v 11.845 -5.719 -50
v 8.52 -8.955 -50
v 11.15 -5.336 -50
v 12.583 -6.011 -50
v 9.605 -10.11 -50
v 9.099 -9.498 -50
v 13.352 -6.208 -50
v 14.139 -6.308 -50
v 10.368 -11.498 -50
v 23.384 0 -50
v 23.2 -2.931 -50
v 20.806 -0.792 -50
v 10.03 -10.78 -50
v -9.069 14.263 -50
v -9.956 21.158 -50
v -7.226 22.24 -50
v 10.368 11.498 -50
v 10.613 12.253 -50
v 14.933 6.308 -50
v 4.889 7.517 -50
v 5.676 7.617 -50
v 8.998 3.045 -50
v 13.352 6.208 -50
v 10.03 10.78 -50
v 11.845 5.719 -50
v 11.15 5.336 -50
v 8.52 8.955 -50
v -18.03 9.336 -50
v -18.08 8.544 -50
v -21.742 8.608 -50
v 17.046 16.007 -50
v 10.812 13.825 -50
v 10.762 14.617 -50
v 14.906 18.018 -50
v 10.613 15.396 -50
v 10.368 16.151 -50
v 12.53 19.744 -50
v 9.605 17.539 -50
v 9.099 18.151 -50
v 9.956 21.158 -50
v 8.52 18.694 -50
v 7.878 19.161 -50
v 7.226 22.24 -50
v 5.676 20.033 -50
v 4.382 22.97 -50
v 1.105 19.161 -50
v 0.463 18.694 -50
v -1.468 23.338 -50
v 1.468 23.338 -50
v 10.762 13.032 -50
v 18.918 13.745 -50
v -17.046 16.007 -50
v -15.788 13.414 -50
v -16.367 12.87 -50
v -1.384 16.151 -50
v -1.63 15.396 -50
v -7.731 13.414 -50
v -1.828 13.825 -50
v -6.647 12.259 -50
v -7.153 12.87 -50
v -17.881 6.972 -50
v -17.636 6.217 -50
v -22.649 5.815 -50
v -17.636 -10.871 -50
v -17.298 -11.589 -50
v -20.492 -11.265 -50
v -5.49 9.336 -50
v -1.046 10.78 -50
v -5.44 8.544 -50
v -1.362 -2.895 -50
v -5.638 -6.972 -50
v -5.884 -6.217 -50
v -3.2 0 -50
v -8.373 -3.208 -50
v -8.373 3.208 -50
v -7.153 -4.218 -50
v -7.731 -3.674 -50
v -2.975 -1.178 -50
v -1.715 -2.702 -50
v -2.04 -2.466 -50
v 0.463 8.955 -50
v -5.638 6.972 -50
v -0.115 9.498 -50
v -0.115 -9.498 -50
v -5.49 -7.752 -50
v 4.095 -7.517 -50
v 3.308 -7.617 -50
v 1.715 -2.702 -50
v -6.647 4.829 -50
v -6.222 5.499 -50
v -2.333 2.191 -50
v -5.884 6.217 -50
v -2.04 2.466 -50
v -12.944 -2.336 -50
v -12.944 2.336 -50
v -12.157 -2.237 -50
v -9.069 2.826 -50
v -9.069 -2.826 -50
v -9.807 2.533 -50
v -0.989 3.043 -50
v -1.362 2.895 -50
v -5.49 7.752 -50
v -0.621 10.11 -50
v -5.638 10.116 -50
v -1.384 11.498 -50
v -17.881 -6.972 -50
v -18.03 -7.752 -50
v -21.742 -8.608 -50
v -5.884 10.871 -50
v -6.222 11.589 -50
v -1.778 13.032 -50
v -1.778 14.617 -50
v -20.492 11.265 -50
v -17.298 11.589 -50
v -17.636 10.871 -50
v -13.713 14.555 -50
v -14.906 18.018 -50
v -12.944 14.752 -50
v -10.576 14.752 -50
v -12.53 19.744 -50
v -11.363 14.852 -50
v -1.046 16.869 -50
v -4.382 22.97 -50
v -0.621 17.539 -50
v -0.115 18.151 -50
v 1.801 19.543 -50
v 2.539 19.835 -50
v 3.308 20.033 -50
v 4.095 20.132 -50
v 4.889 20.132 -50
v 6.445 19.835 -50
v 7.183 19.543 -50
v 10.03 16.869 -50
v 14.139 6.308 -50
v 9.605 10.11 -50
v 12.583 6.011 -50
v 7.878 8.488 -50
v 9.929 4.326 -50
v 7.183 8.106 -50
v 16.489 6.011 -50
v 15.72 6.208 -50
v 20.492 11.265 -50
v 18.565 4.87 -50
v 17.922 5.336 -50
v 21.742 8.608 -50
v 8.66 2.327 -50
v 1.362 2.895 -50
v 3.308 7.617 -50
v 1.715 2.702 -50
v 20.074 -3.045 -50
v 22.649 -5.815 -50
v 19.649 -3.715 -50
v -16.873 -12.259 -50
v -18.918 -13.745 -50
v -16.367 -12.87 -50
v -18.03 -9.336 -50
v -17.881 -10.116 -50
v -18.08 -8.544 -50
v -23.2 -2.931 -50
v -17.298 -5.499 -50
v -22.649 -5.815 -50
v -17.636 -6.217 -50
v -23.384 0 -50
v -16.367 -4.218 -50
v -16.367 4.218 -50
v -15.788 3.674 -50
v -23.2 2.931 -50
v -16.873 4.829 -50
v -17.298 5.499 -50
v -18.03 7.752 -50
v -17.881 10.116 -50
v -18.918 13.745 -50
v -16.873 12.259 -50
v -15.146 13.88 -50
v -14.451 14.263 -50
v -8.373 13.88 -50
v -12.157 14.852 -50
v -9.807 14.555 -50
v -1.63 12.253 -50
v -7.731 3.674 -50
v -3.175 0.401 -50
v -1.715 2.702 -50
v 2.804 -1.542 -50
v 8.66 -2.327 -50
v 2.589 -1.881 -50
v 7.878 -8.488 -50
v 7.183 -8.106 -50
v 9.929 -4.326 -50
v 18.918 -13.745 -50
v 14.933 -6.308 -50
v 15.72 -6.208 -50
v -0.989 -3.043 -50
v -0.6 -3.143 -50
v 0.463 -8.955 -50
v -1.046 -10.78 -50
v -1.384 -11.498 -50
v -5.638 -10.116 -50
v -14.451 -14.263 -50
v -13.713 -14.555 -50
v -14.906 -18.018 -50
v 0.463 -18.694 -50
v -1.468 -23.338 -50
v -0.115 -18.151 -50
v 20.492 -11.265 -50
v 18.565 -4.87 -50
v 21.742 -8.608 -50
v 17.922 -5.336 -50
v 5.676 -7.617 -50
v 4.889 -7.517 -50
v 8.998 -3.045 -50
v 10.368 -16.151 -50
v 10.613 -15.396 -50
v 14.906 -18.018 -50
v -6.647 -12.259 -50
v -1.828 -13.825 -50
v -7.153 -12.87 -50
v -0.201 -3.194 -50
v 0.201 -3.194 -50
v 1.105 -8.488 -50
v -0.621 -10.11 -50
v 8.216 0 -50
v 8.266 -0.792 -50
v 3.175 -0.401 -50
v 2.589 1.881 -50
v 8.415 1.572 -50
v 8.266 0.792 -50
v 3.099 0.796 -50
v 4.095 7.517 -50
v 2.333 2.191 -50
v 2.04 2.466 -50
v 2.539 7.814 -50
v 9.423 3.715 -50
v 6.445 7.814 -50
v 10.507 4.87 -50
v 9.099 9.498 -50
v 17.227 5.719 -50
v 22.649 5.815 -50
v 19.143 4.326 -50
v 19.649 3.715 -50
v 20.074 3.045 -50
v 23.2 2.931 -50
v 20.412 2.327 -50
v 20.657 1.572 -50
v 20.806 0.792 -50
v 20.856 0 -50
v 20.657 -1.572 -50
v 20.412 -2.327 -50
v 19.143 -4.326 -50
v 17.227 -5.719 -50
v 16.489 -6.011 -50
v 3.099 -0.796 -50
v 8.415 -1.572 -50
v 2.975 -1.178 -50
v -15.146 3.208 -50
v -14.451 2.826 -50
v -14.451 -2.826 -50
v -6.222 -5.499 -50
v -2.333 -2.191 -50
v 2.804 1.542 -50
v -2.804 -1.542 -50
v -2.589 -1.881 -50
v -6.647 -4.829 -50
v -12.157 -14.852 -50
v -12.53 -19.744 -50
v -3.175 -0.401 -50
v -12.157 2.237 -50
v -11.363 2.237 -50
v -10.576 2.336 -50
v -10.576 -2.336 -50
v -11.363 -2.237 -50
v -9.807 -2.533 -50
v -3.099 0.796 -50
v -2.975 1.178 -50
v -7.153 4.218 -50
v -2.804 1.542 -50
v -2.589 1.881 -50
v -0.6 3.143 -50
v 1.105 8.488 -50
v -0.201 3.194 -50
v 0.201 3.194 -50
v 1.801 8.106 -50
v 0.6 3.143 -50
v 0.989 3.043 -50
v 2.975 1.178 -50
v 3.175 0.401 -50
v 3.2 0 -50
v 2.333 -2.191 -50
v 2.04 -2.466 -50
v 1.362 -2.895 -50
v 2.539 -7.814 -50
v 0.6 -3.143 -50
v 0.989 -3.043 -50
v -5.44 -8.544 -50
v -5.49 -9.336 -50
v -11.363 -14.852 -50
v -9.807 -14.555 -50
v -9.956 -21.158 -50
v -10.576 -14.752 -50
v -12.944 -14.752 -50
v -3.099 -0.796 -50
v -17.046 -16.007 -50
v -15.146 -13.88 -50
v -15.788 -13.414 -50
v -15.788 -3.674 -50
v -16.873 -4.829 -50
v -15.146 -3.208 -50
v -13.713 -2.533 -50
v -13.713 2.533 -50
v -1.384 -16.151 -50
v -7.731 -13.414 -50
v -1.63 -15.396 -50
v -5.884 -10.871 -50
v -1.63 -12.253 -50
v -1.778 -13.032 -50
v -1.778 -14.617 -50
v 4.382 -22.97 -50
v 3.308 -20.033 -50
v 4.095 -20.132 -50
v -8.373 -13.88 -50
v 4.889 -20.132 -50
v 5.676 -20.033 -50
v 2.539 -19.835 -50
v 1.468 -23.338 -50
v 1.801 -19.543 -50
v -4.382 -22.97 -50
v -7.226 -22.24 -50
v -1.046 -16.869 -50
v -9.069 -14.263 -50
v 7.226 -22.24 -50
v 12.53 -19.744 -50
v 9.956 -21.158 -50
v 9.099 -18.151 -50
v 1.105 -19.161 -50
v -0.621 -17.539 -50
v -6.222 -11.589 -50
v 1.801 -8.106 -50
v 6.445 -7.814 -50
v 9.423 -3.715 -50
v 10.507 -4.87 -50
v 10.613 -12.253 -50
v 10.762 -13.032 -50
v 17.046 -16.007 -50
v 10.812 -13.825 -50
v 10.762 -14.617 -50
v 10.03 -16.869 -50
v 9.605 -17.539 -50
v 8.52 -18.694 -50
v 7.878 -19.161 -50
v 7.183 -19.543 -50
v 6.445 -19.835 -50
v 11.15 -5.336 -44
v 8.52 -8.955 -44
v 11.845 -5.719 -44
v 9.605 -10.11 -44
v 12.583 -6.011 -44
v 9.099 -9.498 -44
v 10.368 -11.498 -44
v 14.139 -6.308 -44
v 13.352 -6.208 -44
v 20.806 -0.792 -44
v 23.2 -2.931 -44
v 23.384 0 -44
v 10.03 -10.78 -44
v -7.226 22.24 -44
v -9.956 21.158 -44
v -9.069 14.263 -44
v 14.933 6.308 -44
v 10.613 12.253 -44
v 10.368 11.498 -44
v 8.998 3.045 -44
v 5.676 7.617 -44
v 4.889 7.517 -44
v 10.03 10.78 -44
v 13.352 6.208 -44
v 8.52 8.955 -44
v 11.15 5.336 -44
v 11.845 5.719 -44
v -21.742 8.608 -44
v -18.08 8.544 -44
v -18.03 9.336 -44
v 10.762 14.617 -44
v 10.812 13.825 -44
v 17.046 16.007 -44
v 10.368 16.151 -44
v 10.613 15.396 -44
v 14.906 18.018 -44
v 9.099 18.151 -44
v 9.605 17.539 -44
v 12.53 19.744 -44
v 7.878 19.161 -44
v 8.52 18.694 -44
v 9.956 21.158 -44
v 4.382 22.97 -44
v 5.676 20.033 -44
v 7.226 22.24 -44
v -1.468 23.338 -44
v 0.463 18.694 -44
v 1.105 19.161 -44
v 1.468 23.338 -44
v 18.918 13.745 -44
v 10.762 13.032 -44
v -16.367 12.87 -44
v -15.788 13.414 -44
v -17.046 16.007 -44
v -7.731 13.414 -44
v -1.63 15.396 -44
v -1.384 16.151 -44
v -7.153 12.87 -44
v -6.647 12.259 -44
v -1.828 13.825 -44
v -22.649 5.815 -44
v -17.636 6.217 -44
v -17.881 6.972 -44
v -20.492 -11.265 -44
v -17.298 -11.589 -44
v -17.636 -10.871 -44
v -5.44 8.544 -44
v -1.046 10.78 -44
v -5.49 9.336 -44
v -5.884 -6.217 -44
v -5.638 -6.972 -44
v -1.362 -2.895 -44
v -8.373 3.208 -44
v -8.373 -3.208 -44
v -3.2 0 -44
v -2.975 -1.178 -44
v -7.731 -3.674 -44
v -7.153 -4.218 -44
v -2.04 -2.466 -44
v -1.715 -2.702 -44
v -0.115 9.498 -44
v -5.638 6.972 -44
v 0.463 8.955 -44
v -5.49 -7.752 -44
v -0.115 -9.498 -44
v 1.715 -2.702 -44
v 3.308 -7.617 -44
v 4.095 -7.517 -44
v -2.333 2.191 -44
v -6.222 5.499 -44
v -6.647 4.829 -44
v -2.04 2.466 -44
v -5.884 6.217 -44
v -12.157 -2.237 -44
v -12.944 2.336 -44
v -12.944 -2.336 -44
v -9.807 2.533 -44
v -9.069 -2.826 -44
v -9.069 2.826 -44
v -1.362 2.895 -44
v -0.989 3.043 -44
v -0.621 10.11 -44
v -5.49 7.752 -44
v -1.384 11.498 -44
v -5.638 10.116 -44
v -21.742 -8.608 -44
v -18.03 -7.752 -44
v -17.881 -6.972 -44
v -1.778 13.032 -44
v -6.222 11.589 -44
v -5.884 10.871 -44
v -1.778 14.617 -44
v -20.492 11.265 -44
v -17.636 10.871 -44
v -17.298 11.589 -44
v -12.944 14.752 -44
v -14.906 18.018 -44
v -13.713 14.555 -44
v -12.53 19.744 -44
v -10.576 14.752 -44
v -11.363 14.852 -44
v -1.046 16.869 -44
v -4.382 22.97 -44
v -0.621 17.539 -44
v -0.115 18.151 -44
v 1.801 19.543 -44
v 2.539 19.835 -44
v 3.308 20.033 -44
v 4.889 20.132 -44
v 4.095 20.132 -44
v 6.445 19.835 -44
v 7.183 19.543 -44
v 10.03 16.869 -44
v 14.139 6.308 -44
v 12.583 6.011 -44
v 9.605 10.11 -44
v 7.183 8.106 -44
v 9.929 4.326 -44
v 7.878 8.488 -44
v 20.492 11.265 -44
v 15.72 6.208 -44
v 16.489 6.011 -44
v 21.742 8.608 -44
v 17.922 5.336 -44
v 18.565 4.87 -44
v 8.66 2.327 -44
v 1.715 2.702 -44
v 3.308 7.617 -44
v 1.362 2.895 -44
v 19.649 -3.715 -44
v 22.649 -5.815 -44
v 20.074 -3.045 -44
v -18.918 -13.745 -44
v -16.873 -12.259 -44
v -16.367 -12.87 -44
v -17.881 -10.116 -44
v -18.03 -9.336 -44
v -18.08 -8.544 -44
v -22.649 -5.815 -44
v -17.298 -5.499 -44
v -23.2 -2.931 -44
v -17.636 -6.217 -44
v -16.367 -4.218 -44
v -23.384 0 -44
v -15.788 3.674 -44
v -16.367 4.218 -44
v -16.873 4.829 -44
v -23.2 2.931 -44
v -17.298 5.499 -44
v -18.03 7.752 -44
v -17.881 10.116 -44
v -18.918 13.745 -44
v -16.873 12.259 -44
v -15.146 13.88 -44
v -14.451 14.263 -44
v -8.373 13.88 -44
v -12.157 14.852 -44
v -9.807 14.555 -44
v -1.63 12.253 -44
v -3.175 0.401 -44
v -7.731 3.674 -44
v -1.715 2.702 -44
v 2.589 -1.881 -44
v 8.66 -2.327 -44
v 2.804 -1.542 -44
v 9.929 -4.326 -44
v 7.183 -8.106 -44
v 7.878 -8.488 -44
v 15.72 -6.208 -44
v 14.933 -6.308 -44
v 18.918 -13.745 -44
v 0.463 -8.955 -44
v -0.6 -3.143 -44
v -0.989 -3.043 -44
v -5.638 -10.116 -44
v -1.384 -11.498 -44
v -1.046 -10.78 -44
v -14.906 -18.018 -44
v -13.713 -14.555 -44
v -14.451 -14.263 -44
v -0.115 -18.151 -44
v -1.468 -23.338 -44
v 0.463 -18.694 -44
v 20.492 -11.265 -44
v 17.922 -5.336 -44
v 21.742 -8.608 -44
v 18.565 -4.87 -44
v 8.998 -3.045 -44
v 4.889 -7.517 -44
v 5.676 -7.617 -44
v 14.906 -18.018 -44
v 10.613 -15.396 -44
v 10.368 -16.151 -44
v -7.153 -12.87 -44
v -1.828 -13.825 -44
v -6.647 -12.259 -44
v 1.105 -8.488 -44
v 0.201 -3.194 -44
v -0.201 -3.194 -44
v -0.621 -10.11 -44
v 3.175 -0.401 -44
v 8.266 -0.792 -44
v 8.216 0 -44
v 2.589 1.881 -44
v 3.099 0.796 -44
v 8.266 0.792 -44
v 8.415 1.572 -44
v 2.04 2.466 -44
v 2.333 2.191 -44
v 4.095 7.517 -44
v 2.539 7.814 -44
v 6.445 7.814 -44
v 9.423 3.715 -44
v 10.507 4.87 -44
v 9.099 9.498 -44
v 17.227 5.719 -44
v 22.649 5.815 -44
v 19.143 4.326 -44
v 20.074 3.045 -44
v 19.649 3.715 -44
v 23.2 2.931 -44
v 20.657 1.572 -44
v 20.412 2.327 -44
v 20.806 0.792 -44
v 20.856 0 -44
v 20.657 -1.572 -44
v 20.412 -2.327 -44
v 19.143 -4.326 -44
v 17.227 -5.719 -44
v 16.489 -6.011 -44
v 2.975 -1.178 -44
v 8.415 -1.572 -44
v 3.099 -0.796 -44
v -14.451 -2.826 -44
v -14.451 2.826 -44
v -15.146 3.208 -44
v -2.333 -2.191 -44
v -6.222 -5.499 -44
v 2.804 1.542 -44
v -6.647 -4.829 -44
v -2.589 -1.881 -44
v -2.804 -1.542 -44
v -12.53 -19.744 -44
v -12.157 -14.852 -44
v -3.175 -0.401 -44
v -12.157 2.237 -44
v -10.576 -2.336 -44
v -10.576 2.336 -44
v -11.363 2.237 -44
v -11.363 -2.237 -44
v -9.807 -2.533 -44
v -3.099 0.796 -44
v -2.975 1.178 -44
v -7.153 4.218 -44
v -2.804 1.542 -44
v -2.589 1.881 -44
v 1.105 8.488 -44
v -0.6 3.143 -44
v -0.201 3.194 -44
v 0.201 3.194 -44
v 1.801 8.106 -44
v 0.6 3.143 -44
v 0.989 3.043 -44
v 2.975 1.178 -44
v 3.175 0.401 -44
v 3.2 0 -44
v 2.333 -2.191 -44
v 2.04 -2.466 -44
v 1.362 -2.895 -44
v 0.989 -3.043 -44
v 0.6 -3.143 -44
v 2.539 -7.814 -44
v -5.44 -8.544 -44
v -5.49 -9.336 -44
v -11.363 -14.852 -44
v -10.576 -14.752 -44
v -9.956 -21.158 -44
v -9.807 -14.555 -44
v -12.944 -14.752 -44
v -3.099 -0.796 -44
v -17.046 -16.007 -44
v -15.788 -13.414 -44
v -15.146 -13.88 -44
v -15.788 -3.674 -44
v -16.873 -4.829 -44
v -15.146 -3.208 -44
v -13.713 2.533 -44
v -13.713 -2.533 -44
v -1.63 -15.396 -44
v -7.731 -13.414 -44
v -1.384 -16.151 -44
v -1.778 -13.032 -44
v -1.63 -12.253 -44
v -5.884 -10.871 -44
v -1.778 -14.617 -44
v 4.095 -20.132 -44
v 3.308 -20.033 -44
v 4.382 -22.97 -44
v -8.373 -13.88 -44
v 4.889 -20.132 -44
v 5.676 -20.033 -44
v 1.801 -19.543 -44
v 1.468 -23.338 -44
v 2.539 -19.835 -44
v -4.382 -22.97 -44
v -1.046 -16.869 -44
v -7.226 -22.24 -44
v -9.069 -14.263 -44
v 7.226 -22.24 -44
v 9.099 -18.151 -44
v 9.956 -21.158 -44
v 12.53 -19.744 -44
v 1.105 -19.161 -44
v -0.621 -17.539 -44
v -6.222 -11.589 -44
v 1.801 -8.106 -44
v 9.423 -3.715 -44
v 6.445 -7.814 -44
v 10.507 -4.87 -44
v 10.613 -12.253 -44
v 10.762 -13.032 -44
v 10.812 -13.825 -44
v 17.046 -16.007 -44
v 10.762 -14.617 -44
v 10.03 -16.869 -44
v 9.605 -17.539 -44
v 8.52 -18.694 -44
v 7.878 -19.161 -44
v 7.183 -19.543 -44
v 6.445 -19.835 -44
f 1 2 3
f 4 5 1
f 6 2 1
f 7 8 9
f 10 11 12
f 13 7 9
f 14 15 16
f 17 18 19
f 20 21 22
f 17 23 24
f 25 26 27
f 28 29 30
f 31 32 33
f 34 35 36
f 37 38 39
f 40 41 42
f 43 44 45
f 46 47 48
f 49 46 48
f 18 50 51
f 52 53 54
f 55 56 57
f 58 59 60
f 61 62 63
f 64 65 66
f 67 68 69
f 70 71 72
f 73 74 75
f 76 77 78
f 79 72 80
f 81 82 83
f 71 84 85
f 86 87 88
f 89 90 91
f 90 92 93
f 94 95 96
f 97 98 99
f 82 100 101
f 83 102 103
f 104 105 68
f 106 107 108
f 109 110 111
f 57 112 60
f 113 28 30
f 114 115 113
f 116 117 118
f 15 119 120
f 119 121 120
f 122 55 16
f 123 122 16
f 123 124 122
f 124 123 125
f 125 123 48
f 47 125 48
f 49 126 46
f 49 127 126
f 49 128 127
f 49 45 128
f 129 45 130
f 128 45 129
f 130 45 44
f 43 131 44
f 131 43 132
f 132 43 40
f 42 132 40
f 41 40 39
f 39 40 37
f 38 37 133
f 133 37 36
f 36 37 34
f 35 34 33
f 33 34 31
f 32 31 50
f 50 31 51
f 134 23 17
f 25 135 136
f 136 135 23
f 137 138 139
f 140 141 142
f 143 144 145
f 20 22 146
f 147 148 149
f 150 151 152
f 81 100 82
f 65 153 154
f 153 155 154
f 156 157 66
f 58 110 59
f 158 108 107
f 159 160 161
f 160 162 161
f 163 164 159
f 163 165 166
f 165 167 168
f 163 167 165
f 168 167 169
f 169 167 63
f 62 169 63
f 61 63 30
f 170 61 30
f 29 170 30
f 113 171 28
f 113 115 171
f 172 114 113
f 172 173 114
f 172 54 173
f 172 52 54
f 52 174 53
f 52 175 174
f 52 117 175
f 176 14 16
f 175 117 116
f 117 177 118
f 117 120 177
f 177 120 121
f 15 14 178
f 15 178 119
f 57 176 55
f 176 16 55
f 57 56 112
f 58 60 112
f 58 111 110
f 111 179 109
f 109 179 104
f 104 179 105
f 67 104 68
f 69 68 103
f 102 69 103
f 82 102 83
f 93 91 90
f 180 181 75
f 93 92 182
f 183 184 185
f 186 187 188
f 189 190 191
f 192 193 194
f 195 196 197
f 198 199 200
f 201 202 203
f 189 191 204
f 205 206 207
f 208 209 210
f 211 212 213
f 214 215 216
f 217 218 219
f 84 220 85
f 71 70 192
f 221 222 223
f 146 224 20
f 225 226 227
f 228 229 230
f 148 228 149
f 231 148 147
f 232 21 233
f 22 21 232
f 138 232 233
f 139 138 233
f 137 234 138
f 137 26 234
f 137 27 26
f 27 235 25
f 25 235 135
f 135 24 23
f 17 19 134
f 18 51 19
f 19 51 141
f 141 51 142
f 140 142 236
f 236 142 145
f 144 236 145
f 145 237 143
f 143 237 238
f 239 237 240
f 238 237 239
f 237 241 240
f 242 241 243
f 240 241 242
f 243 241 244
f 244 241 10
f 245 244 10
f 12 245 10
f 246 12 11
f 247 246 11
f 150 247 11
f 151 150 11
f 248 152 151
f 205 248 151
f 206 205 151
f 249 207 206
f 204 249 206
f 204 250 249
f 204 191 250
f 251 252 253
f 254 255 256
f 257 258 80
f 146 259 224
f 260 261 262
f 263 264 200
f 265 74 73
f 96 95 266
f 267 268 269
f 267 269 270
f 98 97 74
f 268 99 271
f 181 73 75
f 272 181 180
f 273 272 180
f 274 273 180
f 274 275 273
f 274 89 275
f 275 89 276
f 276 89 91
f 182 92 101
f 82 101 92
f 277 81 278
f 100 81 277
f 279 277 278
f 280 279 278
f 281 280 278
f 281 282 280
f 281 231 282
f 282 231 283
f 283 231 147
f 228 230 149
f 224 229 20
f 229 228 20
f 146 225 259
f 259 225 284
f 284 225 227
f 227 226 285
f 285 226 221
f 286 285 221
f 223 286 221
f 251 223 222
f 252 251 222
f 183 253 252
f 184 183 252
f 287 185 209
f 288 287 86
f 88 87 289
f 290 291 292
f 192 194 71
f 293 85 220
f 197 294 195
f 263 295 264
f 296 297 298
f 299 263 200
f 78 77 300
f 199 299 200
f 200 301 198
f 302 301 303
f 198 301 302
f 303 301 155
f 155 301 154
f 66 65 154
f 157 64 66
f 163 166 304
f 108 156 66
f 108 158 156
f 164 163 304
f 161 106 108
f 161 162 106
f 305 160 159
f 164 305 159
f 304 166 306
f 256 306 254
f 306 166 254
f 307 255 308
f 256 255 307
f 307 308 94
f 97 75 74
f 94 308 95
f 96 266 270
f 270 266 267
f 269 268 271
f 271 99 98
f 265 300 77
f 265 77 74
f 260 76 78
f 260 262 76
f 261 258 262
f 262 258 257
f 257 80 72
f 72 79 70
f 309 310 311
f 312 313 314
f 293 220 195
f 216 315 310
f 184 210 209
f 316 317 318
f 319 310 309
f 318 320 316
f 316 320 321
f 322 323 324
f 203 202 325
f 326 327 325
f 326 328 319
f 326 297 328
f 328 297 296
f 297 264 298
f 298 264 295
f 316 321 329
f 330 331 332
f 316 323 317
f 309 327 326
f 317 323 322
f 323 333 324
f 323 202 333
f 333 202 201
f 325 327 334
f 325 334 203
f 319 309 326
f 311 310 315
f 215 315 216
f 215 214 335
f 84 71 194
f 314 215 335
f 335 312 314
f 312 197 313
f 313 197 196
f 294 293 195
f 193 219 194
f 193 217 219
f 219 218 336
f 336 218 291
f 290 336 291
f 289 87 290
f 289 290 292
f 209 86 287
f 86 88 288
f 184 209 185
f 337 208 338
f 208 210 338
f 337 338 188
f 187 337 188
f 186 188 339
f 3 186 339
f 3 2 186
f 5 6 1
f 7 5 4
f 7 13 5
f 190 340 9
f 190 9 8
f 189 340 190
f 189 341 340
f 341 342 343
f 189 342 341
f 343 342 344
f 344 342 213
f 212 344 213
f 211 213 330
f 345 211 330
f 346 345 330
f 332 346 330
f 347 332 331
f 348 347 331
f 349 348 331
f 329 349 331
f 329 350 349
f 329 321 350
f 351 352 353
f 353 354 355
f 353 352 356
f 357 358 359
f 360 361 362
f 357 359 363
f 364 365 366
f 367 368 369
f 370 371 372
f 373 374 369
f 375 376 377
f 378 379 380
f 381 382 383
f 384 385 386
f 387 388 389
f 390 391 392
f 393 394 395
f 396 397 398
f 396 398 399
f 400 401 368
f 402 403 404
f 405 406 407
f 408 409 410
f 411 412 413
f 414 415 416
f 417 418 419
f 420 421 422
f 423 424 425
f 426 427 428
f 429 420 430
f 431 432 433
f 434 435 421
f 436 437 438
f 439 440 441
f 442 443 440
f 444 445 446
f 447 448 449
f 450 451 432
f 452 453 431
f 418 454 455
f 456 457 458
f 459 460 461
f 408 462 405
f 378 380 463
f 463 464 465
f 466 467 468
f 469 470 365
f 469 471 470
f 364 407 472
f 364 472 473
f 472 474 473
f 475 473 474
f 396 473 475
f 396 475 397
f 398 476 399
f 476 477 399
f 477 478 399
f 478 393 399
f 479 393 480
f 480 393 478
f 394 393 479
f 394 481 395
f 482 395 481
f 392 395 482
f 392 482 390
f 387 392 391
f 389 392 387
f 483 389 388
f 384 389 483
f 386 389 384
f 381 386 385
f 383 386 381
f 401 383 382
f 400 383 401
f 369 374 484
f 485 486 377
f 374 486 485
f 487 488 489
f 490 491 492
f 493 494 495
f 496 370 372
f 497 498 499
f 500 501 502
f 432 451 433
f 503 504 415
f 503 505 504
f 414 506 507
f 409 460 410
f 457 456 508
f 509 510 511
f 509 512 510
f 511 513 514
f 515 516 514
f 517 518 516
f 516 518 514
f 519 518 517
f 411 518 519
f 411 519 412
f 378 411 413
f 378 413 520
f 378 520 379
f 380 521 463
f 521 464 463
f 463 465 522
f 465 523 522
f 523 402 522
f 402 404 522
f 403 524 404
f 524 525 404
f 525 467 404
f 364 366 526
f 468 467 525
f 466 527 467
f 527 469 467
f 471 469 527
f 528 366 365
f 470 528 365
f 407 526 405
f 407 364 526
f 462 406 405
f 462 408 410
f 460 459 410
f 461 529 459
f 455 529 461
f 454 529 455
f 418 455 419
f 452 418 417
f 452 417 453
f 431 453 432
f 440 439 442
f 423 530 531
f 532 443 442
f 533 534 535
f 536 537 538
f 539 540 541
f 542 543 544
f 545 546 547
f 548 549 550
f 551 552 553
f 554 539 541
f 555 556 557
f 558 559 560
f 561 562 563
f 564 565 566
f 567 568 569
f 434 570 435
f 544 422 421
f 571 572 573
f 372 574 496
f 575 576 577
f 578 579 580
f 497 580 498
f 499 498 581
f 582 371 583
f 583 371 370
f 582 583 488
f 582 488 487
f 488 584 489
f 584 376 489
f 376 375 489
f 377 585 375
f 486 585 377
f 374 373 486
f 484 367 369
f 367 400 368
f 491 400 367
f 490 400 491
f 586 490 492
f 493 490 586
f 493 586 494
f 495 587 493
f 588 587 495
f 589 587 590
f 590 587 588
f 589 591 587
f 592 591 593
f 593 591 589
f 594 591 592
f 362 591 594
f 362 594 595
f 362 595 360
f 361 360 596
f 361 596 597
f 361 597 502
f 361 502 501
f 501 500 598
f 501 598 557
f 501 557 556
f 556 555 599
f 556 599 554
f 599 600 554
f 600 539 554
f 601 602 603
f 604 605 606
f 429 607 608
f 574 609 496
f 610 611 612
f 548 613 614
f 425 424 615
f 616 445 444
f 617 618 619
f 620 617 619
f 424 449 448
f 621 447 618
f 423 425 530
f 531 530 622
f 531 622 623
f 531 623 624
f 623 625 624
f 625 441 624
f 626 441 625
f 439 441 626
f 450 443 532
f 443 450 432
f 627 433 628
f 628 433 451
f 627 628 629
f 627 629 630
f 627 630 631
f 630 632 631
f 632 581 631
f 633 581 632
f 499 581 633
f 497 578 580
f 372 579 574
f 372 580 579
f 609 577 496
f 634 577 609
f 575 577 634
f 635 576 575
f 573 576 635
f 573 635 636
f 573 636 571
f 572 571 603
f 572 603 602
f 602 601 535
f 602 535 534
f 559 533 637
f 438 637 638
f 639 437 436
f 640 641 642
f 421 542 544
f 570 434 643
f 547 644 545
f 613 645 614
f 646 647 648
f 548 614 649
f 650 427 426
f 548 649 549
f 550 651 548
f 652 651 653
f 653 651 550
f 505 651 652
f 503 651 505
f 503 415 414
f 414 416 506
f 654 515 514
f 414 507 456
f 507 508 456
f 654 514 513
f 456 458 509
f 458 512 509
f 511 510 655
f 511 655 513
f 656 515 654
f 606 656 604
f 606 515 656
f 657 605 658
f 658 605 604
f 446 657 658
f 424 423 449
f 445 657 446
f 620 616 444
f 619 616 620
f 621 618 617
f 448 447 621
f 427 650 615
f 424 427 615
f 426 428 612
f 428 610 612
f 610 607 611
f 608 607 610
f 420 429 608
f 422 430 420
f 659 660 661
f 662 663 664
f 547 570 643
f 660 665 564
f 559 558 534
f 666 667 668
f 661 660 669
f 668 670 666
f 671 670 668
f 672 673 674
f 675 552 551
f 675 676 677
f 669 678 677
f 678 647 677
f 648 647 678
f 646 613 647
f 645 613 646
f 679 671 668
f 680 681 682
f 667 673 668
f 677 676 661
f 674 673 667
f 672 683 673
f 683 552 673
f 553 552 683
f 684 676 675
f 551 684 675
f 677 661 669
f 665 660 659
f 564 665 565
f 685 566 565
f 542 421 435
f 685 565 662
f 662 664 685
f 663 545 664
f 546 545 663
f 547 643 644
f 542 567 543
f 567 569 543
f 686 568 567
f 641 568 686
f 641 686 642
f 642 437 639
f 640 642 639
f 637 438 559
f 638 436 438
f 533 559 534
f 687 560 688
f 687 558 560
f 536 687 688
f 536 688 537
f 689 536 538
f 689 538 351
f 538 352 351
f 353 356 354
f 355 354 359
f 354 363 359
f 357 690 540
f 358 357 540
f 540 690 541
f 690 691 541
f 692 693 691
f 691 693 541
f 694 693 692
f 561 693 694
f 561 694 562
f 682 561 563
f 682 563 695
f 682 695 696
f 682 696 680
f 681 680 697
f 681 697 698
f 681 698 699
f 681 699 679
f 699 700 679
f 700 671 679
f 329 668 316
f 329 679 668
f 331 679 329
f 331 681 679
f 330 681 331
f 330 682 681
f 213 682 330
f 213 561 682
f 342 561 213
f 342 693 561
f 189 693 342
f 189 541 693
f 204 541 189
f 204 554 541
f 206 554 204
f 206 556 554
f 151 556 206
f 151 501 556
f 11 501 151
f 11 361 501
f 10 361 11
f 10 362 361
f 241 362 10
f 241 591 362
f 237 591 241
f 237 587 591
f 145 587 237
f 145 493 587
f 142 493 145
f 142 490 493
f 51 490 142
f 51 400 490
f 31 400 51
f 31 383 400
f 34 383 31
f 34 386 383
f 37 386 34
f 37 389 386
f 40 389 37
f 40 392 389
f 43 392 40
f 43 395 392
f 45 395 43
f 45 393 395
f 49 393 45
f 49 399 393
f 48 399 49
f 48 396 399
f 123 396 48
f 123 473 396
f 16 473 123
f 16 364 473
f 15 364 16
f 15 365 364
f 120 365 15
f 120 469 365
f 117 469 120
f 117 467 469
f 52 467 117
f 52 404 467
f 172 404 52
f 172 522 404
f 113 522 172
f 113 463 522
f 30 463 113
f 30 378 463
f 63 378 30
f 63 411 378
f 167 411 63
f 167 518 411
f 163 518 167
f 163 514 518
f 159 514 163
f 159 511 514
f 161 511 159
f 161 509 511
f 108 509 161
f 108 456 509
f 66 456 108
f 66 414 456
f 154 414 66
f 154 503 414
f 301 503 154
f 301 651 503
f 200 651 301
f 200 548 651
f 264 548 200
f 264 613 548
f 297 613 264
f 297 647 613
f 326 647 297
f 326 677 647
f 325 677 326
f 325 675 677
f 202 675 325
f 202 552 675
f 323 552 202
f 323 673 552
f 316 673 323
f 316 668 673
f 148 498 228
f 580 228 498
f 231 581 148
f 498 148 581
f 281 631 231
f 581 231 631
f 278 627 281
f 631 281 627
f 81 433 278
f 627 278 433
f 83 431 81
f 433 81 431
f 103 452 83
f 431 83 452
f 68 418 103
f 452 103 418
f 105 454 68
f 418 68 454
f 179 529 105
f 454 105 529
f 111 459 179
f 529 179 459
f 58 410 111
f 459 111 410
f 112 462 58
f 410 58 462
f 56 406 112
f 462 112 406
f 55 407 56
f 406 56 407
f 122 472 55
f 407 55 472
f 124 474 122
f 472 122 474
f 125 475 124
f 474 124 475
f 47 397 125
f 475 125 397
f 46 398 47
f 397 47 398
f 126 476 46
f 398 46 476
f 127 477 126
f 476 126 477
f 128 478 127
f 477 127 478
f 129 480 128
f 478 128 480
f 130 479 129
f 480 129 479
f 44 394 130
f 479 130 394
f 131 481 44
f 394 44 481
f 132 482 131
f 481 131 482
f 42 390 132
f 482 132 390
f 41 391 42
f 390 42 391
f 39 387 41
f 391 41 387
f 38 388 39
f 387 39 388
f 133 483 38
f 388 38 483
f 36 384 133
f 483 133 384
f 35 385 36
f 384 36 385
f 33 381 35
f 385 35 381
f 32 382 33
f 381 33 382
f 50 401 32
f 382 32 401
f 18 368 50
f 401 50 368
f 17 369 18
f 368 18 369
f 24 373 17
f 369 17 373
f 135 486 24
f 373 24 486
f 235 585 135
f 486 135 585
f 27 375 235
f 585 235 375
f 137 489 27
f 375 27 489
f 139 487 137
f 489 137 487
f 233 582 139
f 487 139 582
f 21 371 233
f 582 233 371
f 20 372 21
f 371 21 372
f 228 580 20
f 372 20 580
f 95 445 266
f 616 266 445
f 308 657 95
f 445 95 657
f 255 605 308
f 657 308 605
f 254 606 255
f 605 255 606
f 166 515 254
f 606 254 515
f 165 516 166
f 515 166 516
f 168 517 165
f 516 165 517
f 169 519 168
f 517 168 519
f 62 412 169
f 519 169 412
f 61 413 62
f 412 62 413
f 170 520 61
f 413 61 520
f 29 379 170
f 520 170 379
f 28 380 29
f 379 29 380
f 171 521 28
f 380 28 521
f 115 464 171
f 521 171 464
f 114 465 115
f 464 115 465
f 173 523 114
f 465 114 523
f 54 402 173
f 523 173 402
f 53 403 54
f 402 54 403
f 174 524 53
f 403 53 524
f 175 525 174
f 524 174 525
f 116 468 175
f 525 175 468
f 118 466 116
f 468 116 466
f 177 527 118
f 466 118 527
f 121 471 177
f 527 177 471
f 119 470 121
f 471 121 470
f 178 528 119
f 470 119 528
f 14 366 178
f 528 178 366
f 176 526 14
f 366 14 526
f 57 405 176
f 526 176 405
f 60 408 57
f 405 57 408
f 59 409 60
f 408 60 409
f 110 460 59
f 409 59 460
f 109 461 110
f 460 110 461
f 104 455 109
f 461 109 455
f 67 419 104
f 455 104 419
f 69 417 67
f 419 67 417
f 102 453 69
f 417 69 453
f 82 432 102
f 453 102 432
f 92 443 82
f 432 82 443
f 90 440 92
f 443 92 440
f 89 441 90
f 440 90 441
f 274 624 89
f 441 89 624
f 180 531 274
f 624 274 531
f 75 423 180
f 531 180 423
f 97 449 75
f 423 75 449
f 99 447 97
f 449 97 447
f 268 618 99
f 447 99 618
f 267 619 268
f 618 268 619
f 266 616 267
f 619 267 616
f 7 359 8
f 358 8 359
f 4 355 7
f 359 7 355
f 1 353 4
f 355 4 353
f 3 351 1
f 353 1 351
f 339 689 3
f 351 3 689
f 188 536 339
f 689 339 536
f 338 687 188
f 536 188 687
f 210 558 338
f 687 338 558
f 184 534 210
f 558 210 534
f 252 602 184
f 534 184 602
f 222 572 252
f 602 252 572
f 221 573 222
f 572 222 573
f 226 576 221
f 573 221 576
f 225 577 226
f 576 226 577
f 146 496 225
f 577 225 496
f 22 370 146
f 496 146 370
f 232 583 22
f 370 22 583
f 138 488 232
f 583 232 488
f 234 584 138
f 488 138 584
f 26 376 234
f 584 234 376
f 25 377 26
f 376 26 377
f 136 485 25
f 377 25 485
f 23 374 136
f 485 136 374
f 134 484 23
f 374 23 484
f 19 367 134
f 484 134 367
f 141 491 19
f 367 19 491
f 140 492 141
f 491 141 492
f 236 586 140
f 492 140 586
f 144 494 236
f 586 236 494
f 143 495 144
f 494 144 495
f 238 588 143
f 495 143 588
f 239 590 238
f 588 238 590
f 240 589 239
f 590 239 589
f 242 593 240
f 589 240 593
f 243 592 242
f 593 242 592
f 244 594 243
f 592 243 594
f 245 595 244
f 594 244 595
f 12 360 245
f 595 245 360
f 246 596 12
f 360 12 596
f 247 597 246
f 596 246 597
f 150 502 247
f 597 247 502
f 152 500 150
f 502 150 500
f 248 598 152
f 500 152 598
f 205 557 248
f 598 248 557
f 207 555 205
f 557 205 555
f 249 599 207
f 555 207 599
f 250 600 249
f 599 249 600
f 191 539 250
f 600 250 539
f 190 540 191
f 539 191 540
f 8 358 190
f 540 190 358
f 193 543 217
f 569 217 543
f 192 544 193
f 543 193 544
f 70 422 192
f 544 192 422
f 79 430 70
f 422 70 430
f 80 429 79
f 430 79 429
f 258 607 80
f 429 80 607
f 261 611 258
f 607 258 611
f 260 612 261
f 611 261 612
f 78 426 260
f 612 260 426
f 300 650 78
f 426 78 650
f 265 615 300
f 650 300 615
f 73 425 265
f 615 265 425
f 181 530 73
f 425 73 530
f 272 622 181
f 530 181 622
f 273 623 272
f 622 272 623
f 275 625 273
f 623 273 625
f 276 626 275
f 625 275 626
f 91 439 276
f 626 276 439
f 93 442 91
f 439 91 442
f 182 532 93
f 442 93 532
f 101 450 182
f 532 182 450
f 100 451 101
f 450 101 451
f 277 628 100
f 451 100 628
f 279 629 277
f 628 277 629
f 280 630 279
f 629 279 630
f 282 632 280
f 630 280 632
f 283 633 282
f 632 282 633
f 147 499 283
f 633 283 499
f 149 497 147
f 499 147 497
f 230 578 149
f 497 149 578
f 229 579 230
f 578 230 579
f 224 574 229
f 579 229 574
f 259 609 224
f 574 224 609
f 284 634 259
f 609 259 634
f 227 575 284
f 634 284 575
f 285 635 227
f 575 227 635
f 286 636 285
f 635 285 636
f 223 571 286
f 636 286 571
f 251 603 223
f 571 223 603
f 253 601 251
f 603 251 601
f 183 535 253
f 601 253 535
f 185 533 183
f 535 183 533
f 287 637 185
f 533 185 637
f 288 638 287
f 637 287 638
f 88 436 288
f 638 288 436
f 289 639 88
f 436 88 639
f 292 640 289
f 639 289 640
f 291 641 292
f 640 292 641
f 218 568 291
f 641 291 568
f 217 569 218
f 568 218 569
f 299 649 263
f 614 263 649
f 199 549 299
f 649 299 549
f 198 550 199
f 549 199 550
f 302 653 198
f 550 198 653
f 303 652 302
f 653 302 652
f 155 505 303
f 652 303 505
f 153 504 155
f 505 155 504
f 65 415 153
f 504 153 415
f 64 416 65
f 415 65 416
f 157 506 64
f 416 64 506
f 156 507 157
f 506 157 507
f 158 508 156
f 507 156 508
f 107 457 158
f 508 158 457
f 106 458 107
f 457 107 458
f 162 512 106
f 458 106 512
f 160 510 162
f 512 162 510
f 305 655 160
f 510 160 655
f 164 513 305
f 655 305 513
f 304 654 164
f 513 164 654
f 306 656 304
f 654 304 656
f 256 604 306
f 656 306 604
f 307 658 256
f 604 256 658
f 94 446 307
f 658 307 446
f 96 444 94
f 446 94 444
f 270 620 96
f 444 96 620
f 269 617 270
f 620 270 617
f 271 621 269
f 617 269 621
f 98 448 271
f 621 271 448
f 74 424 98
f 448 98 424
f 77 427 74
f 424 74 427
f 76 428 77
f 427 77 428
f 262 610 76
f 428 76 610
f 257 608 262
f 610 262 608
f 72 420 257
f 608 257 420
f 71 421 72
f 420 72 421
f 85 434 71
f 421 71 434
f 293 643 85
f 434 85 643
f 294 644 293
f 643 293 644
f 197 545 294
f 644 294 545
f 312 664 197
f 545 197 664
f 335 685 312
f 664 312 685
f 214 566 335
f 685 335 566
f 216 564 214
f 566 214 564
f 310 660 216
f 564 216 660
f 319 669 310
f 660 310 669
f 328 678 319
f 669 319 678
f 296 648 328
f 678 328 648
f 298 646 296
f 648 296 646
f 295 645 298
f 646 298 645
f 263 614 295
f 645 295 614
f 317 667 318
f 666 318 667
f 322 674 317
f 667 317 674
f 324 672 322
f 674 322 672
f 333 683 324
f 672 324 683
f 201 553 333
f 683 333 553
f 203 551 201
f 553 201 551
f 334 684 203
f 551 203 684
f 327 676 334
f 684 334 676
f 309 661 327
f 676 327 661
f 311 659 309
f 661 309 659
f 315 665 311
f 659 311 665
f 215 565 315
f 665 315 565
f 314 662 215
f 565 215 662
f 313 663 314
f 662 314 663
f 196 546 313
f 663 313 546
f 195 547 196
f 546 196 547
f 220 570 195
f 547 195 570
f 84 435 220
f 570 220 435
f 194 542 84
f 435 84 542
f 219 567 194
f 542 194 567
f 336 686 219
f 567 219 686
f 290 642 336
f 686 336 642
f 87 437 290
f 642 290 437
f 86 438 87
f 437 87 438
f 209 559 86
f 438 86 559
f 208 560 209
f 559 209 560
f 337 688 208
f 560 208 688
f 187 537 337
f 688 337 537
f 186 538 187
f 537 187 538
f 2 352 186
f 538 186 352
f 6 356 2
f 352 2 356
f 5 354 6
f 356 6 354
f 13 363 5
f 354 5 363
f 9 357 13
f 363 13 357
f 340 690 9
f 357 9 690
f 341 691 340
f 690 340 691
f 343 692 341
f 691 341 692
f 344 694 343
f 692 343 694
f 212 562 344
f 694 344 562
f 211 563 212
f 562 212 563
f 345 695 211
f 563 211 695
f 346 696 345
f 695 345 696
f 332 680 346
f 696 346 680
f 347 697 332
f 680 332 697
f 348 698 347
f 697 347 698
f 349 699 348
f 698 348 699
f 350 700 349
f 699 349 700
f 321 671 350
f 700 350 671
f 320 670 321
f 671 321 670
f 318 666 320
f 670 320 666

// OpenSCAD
$fn=50;
tube_radius = 12;
inner_tube_radius = 6.32;
holder_height = 6;
middle_rod = 3.2;
middle_rod_bottom = 5.2;
module top(){
    linear_extrude(height = holder_height){
        difference(){    
            circle(r = inner_tube_radius*3.7);
           
            
            for (i=[1: 5]) {
                rotate([0,0,i*360/5]) {
                    translate([inner_tube_radius*2.3,0,0]){
                        circle(r = inner_tube_radius);
                    }
                }
            }
            //middle_rod
            circle(r=middle_rod);
        }        
    }
}

module bottom(){
    difference(){    
        linear_extrude(height = holder_height){        
            circle(r = inner_tube_radius*3.7);
        }
        linear_extrude(height = holder_height/2){           
            
            for (i=[1: 5]) {
                rotate([0,0,i*360/5]) {
                    translate([inner_tube_radius*2.3,0,0]){
                        circle(r = inner_tube_radius);
                    }
                }
            }           
        }
    //middle_rod    
         linear_extrude(height = holder_height){   
         
            circle(r=middle_rod_bottom);
         }
         translate([-2.1/2,-middle_rod_bottom-2,0]){
             cube([2.1,middle_rod_bottom*2+4,holder_height]){
             }
         }  
         rotate([0,0,90]){
             translate([-2.1/2,-middle_rod_bottom-2,0]){
                 cube([2.1,middle_rod_bottom*2+4,holder_height]){
                 }
             }  
         }
    }
}

translate([0,0,-50]){
    top();
}
//bottom();
